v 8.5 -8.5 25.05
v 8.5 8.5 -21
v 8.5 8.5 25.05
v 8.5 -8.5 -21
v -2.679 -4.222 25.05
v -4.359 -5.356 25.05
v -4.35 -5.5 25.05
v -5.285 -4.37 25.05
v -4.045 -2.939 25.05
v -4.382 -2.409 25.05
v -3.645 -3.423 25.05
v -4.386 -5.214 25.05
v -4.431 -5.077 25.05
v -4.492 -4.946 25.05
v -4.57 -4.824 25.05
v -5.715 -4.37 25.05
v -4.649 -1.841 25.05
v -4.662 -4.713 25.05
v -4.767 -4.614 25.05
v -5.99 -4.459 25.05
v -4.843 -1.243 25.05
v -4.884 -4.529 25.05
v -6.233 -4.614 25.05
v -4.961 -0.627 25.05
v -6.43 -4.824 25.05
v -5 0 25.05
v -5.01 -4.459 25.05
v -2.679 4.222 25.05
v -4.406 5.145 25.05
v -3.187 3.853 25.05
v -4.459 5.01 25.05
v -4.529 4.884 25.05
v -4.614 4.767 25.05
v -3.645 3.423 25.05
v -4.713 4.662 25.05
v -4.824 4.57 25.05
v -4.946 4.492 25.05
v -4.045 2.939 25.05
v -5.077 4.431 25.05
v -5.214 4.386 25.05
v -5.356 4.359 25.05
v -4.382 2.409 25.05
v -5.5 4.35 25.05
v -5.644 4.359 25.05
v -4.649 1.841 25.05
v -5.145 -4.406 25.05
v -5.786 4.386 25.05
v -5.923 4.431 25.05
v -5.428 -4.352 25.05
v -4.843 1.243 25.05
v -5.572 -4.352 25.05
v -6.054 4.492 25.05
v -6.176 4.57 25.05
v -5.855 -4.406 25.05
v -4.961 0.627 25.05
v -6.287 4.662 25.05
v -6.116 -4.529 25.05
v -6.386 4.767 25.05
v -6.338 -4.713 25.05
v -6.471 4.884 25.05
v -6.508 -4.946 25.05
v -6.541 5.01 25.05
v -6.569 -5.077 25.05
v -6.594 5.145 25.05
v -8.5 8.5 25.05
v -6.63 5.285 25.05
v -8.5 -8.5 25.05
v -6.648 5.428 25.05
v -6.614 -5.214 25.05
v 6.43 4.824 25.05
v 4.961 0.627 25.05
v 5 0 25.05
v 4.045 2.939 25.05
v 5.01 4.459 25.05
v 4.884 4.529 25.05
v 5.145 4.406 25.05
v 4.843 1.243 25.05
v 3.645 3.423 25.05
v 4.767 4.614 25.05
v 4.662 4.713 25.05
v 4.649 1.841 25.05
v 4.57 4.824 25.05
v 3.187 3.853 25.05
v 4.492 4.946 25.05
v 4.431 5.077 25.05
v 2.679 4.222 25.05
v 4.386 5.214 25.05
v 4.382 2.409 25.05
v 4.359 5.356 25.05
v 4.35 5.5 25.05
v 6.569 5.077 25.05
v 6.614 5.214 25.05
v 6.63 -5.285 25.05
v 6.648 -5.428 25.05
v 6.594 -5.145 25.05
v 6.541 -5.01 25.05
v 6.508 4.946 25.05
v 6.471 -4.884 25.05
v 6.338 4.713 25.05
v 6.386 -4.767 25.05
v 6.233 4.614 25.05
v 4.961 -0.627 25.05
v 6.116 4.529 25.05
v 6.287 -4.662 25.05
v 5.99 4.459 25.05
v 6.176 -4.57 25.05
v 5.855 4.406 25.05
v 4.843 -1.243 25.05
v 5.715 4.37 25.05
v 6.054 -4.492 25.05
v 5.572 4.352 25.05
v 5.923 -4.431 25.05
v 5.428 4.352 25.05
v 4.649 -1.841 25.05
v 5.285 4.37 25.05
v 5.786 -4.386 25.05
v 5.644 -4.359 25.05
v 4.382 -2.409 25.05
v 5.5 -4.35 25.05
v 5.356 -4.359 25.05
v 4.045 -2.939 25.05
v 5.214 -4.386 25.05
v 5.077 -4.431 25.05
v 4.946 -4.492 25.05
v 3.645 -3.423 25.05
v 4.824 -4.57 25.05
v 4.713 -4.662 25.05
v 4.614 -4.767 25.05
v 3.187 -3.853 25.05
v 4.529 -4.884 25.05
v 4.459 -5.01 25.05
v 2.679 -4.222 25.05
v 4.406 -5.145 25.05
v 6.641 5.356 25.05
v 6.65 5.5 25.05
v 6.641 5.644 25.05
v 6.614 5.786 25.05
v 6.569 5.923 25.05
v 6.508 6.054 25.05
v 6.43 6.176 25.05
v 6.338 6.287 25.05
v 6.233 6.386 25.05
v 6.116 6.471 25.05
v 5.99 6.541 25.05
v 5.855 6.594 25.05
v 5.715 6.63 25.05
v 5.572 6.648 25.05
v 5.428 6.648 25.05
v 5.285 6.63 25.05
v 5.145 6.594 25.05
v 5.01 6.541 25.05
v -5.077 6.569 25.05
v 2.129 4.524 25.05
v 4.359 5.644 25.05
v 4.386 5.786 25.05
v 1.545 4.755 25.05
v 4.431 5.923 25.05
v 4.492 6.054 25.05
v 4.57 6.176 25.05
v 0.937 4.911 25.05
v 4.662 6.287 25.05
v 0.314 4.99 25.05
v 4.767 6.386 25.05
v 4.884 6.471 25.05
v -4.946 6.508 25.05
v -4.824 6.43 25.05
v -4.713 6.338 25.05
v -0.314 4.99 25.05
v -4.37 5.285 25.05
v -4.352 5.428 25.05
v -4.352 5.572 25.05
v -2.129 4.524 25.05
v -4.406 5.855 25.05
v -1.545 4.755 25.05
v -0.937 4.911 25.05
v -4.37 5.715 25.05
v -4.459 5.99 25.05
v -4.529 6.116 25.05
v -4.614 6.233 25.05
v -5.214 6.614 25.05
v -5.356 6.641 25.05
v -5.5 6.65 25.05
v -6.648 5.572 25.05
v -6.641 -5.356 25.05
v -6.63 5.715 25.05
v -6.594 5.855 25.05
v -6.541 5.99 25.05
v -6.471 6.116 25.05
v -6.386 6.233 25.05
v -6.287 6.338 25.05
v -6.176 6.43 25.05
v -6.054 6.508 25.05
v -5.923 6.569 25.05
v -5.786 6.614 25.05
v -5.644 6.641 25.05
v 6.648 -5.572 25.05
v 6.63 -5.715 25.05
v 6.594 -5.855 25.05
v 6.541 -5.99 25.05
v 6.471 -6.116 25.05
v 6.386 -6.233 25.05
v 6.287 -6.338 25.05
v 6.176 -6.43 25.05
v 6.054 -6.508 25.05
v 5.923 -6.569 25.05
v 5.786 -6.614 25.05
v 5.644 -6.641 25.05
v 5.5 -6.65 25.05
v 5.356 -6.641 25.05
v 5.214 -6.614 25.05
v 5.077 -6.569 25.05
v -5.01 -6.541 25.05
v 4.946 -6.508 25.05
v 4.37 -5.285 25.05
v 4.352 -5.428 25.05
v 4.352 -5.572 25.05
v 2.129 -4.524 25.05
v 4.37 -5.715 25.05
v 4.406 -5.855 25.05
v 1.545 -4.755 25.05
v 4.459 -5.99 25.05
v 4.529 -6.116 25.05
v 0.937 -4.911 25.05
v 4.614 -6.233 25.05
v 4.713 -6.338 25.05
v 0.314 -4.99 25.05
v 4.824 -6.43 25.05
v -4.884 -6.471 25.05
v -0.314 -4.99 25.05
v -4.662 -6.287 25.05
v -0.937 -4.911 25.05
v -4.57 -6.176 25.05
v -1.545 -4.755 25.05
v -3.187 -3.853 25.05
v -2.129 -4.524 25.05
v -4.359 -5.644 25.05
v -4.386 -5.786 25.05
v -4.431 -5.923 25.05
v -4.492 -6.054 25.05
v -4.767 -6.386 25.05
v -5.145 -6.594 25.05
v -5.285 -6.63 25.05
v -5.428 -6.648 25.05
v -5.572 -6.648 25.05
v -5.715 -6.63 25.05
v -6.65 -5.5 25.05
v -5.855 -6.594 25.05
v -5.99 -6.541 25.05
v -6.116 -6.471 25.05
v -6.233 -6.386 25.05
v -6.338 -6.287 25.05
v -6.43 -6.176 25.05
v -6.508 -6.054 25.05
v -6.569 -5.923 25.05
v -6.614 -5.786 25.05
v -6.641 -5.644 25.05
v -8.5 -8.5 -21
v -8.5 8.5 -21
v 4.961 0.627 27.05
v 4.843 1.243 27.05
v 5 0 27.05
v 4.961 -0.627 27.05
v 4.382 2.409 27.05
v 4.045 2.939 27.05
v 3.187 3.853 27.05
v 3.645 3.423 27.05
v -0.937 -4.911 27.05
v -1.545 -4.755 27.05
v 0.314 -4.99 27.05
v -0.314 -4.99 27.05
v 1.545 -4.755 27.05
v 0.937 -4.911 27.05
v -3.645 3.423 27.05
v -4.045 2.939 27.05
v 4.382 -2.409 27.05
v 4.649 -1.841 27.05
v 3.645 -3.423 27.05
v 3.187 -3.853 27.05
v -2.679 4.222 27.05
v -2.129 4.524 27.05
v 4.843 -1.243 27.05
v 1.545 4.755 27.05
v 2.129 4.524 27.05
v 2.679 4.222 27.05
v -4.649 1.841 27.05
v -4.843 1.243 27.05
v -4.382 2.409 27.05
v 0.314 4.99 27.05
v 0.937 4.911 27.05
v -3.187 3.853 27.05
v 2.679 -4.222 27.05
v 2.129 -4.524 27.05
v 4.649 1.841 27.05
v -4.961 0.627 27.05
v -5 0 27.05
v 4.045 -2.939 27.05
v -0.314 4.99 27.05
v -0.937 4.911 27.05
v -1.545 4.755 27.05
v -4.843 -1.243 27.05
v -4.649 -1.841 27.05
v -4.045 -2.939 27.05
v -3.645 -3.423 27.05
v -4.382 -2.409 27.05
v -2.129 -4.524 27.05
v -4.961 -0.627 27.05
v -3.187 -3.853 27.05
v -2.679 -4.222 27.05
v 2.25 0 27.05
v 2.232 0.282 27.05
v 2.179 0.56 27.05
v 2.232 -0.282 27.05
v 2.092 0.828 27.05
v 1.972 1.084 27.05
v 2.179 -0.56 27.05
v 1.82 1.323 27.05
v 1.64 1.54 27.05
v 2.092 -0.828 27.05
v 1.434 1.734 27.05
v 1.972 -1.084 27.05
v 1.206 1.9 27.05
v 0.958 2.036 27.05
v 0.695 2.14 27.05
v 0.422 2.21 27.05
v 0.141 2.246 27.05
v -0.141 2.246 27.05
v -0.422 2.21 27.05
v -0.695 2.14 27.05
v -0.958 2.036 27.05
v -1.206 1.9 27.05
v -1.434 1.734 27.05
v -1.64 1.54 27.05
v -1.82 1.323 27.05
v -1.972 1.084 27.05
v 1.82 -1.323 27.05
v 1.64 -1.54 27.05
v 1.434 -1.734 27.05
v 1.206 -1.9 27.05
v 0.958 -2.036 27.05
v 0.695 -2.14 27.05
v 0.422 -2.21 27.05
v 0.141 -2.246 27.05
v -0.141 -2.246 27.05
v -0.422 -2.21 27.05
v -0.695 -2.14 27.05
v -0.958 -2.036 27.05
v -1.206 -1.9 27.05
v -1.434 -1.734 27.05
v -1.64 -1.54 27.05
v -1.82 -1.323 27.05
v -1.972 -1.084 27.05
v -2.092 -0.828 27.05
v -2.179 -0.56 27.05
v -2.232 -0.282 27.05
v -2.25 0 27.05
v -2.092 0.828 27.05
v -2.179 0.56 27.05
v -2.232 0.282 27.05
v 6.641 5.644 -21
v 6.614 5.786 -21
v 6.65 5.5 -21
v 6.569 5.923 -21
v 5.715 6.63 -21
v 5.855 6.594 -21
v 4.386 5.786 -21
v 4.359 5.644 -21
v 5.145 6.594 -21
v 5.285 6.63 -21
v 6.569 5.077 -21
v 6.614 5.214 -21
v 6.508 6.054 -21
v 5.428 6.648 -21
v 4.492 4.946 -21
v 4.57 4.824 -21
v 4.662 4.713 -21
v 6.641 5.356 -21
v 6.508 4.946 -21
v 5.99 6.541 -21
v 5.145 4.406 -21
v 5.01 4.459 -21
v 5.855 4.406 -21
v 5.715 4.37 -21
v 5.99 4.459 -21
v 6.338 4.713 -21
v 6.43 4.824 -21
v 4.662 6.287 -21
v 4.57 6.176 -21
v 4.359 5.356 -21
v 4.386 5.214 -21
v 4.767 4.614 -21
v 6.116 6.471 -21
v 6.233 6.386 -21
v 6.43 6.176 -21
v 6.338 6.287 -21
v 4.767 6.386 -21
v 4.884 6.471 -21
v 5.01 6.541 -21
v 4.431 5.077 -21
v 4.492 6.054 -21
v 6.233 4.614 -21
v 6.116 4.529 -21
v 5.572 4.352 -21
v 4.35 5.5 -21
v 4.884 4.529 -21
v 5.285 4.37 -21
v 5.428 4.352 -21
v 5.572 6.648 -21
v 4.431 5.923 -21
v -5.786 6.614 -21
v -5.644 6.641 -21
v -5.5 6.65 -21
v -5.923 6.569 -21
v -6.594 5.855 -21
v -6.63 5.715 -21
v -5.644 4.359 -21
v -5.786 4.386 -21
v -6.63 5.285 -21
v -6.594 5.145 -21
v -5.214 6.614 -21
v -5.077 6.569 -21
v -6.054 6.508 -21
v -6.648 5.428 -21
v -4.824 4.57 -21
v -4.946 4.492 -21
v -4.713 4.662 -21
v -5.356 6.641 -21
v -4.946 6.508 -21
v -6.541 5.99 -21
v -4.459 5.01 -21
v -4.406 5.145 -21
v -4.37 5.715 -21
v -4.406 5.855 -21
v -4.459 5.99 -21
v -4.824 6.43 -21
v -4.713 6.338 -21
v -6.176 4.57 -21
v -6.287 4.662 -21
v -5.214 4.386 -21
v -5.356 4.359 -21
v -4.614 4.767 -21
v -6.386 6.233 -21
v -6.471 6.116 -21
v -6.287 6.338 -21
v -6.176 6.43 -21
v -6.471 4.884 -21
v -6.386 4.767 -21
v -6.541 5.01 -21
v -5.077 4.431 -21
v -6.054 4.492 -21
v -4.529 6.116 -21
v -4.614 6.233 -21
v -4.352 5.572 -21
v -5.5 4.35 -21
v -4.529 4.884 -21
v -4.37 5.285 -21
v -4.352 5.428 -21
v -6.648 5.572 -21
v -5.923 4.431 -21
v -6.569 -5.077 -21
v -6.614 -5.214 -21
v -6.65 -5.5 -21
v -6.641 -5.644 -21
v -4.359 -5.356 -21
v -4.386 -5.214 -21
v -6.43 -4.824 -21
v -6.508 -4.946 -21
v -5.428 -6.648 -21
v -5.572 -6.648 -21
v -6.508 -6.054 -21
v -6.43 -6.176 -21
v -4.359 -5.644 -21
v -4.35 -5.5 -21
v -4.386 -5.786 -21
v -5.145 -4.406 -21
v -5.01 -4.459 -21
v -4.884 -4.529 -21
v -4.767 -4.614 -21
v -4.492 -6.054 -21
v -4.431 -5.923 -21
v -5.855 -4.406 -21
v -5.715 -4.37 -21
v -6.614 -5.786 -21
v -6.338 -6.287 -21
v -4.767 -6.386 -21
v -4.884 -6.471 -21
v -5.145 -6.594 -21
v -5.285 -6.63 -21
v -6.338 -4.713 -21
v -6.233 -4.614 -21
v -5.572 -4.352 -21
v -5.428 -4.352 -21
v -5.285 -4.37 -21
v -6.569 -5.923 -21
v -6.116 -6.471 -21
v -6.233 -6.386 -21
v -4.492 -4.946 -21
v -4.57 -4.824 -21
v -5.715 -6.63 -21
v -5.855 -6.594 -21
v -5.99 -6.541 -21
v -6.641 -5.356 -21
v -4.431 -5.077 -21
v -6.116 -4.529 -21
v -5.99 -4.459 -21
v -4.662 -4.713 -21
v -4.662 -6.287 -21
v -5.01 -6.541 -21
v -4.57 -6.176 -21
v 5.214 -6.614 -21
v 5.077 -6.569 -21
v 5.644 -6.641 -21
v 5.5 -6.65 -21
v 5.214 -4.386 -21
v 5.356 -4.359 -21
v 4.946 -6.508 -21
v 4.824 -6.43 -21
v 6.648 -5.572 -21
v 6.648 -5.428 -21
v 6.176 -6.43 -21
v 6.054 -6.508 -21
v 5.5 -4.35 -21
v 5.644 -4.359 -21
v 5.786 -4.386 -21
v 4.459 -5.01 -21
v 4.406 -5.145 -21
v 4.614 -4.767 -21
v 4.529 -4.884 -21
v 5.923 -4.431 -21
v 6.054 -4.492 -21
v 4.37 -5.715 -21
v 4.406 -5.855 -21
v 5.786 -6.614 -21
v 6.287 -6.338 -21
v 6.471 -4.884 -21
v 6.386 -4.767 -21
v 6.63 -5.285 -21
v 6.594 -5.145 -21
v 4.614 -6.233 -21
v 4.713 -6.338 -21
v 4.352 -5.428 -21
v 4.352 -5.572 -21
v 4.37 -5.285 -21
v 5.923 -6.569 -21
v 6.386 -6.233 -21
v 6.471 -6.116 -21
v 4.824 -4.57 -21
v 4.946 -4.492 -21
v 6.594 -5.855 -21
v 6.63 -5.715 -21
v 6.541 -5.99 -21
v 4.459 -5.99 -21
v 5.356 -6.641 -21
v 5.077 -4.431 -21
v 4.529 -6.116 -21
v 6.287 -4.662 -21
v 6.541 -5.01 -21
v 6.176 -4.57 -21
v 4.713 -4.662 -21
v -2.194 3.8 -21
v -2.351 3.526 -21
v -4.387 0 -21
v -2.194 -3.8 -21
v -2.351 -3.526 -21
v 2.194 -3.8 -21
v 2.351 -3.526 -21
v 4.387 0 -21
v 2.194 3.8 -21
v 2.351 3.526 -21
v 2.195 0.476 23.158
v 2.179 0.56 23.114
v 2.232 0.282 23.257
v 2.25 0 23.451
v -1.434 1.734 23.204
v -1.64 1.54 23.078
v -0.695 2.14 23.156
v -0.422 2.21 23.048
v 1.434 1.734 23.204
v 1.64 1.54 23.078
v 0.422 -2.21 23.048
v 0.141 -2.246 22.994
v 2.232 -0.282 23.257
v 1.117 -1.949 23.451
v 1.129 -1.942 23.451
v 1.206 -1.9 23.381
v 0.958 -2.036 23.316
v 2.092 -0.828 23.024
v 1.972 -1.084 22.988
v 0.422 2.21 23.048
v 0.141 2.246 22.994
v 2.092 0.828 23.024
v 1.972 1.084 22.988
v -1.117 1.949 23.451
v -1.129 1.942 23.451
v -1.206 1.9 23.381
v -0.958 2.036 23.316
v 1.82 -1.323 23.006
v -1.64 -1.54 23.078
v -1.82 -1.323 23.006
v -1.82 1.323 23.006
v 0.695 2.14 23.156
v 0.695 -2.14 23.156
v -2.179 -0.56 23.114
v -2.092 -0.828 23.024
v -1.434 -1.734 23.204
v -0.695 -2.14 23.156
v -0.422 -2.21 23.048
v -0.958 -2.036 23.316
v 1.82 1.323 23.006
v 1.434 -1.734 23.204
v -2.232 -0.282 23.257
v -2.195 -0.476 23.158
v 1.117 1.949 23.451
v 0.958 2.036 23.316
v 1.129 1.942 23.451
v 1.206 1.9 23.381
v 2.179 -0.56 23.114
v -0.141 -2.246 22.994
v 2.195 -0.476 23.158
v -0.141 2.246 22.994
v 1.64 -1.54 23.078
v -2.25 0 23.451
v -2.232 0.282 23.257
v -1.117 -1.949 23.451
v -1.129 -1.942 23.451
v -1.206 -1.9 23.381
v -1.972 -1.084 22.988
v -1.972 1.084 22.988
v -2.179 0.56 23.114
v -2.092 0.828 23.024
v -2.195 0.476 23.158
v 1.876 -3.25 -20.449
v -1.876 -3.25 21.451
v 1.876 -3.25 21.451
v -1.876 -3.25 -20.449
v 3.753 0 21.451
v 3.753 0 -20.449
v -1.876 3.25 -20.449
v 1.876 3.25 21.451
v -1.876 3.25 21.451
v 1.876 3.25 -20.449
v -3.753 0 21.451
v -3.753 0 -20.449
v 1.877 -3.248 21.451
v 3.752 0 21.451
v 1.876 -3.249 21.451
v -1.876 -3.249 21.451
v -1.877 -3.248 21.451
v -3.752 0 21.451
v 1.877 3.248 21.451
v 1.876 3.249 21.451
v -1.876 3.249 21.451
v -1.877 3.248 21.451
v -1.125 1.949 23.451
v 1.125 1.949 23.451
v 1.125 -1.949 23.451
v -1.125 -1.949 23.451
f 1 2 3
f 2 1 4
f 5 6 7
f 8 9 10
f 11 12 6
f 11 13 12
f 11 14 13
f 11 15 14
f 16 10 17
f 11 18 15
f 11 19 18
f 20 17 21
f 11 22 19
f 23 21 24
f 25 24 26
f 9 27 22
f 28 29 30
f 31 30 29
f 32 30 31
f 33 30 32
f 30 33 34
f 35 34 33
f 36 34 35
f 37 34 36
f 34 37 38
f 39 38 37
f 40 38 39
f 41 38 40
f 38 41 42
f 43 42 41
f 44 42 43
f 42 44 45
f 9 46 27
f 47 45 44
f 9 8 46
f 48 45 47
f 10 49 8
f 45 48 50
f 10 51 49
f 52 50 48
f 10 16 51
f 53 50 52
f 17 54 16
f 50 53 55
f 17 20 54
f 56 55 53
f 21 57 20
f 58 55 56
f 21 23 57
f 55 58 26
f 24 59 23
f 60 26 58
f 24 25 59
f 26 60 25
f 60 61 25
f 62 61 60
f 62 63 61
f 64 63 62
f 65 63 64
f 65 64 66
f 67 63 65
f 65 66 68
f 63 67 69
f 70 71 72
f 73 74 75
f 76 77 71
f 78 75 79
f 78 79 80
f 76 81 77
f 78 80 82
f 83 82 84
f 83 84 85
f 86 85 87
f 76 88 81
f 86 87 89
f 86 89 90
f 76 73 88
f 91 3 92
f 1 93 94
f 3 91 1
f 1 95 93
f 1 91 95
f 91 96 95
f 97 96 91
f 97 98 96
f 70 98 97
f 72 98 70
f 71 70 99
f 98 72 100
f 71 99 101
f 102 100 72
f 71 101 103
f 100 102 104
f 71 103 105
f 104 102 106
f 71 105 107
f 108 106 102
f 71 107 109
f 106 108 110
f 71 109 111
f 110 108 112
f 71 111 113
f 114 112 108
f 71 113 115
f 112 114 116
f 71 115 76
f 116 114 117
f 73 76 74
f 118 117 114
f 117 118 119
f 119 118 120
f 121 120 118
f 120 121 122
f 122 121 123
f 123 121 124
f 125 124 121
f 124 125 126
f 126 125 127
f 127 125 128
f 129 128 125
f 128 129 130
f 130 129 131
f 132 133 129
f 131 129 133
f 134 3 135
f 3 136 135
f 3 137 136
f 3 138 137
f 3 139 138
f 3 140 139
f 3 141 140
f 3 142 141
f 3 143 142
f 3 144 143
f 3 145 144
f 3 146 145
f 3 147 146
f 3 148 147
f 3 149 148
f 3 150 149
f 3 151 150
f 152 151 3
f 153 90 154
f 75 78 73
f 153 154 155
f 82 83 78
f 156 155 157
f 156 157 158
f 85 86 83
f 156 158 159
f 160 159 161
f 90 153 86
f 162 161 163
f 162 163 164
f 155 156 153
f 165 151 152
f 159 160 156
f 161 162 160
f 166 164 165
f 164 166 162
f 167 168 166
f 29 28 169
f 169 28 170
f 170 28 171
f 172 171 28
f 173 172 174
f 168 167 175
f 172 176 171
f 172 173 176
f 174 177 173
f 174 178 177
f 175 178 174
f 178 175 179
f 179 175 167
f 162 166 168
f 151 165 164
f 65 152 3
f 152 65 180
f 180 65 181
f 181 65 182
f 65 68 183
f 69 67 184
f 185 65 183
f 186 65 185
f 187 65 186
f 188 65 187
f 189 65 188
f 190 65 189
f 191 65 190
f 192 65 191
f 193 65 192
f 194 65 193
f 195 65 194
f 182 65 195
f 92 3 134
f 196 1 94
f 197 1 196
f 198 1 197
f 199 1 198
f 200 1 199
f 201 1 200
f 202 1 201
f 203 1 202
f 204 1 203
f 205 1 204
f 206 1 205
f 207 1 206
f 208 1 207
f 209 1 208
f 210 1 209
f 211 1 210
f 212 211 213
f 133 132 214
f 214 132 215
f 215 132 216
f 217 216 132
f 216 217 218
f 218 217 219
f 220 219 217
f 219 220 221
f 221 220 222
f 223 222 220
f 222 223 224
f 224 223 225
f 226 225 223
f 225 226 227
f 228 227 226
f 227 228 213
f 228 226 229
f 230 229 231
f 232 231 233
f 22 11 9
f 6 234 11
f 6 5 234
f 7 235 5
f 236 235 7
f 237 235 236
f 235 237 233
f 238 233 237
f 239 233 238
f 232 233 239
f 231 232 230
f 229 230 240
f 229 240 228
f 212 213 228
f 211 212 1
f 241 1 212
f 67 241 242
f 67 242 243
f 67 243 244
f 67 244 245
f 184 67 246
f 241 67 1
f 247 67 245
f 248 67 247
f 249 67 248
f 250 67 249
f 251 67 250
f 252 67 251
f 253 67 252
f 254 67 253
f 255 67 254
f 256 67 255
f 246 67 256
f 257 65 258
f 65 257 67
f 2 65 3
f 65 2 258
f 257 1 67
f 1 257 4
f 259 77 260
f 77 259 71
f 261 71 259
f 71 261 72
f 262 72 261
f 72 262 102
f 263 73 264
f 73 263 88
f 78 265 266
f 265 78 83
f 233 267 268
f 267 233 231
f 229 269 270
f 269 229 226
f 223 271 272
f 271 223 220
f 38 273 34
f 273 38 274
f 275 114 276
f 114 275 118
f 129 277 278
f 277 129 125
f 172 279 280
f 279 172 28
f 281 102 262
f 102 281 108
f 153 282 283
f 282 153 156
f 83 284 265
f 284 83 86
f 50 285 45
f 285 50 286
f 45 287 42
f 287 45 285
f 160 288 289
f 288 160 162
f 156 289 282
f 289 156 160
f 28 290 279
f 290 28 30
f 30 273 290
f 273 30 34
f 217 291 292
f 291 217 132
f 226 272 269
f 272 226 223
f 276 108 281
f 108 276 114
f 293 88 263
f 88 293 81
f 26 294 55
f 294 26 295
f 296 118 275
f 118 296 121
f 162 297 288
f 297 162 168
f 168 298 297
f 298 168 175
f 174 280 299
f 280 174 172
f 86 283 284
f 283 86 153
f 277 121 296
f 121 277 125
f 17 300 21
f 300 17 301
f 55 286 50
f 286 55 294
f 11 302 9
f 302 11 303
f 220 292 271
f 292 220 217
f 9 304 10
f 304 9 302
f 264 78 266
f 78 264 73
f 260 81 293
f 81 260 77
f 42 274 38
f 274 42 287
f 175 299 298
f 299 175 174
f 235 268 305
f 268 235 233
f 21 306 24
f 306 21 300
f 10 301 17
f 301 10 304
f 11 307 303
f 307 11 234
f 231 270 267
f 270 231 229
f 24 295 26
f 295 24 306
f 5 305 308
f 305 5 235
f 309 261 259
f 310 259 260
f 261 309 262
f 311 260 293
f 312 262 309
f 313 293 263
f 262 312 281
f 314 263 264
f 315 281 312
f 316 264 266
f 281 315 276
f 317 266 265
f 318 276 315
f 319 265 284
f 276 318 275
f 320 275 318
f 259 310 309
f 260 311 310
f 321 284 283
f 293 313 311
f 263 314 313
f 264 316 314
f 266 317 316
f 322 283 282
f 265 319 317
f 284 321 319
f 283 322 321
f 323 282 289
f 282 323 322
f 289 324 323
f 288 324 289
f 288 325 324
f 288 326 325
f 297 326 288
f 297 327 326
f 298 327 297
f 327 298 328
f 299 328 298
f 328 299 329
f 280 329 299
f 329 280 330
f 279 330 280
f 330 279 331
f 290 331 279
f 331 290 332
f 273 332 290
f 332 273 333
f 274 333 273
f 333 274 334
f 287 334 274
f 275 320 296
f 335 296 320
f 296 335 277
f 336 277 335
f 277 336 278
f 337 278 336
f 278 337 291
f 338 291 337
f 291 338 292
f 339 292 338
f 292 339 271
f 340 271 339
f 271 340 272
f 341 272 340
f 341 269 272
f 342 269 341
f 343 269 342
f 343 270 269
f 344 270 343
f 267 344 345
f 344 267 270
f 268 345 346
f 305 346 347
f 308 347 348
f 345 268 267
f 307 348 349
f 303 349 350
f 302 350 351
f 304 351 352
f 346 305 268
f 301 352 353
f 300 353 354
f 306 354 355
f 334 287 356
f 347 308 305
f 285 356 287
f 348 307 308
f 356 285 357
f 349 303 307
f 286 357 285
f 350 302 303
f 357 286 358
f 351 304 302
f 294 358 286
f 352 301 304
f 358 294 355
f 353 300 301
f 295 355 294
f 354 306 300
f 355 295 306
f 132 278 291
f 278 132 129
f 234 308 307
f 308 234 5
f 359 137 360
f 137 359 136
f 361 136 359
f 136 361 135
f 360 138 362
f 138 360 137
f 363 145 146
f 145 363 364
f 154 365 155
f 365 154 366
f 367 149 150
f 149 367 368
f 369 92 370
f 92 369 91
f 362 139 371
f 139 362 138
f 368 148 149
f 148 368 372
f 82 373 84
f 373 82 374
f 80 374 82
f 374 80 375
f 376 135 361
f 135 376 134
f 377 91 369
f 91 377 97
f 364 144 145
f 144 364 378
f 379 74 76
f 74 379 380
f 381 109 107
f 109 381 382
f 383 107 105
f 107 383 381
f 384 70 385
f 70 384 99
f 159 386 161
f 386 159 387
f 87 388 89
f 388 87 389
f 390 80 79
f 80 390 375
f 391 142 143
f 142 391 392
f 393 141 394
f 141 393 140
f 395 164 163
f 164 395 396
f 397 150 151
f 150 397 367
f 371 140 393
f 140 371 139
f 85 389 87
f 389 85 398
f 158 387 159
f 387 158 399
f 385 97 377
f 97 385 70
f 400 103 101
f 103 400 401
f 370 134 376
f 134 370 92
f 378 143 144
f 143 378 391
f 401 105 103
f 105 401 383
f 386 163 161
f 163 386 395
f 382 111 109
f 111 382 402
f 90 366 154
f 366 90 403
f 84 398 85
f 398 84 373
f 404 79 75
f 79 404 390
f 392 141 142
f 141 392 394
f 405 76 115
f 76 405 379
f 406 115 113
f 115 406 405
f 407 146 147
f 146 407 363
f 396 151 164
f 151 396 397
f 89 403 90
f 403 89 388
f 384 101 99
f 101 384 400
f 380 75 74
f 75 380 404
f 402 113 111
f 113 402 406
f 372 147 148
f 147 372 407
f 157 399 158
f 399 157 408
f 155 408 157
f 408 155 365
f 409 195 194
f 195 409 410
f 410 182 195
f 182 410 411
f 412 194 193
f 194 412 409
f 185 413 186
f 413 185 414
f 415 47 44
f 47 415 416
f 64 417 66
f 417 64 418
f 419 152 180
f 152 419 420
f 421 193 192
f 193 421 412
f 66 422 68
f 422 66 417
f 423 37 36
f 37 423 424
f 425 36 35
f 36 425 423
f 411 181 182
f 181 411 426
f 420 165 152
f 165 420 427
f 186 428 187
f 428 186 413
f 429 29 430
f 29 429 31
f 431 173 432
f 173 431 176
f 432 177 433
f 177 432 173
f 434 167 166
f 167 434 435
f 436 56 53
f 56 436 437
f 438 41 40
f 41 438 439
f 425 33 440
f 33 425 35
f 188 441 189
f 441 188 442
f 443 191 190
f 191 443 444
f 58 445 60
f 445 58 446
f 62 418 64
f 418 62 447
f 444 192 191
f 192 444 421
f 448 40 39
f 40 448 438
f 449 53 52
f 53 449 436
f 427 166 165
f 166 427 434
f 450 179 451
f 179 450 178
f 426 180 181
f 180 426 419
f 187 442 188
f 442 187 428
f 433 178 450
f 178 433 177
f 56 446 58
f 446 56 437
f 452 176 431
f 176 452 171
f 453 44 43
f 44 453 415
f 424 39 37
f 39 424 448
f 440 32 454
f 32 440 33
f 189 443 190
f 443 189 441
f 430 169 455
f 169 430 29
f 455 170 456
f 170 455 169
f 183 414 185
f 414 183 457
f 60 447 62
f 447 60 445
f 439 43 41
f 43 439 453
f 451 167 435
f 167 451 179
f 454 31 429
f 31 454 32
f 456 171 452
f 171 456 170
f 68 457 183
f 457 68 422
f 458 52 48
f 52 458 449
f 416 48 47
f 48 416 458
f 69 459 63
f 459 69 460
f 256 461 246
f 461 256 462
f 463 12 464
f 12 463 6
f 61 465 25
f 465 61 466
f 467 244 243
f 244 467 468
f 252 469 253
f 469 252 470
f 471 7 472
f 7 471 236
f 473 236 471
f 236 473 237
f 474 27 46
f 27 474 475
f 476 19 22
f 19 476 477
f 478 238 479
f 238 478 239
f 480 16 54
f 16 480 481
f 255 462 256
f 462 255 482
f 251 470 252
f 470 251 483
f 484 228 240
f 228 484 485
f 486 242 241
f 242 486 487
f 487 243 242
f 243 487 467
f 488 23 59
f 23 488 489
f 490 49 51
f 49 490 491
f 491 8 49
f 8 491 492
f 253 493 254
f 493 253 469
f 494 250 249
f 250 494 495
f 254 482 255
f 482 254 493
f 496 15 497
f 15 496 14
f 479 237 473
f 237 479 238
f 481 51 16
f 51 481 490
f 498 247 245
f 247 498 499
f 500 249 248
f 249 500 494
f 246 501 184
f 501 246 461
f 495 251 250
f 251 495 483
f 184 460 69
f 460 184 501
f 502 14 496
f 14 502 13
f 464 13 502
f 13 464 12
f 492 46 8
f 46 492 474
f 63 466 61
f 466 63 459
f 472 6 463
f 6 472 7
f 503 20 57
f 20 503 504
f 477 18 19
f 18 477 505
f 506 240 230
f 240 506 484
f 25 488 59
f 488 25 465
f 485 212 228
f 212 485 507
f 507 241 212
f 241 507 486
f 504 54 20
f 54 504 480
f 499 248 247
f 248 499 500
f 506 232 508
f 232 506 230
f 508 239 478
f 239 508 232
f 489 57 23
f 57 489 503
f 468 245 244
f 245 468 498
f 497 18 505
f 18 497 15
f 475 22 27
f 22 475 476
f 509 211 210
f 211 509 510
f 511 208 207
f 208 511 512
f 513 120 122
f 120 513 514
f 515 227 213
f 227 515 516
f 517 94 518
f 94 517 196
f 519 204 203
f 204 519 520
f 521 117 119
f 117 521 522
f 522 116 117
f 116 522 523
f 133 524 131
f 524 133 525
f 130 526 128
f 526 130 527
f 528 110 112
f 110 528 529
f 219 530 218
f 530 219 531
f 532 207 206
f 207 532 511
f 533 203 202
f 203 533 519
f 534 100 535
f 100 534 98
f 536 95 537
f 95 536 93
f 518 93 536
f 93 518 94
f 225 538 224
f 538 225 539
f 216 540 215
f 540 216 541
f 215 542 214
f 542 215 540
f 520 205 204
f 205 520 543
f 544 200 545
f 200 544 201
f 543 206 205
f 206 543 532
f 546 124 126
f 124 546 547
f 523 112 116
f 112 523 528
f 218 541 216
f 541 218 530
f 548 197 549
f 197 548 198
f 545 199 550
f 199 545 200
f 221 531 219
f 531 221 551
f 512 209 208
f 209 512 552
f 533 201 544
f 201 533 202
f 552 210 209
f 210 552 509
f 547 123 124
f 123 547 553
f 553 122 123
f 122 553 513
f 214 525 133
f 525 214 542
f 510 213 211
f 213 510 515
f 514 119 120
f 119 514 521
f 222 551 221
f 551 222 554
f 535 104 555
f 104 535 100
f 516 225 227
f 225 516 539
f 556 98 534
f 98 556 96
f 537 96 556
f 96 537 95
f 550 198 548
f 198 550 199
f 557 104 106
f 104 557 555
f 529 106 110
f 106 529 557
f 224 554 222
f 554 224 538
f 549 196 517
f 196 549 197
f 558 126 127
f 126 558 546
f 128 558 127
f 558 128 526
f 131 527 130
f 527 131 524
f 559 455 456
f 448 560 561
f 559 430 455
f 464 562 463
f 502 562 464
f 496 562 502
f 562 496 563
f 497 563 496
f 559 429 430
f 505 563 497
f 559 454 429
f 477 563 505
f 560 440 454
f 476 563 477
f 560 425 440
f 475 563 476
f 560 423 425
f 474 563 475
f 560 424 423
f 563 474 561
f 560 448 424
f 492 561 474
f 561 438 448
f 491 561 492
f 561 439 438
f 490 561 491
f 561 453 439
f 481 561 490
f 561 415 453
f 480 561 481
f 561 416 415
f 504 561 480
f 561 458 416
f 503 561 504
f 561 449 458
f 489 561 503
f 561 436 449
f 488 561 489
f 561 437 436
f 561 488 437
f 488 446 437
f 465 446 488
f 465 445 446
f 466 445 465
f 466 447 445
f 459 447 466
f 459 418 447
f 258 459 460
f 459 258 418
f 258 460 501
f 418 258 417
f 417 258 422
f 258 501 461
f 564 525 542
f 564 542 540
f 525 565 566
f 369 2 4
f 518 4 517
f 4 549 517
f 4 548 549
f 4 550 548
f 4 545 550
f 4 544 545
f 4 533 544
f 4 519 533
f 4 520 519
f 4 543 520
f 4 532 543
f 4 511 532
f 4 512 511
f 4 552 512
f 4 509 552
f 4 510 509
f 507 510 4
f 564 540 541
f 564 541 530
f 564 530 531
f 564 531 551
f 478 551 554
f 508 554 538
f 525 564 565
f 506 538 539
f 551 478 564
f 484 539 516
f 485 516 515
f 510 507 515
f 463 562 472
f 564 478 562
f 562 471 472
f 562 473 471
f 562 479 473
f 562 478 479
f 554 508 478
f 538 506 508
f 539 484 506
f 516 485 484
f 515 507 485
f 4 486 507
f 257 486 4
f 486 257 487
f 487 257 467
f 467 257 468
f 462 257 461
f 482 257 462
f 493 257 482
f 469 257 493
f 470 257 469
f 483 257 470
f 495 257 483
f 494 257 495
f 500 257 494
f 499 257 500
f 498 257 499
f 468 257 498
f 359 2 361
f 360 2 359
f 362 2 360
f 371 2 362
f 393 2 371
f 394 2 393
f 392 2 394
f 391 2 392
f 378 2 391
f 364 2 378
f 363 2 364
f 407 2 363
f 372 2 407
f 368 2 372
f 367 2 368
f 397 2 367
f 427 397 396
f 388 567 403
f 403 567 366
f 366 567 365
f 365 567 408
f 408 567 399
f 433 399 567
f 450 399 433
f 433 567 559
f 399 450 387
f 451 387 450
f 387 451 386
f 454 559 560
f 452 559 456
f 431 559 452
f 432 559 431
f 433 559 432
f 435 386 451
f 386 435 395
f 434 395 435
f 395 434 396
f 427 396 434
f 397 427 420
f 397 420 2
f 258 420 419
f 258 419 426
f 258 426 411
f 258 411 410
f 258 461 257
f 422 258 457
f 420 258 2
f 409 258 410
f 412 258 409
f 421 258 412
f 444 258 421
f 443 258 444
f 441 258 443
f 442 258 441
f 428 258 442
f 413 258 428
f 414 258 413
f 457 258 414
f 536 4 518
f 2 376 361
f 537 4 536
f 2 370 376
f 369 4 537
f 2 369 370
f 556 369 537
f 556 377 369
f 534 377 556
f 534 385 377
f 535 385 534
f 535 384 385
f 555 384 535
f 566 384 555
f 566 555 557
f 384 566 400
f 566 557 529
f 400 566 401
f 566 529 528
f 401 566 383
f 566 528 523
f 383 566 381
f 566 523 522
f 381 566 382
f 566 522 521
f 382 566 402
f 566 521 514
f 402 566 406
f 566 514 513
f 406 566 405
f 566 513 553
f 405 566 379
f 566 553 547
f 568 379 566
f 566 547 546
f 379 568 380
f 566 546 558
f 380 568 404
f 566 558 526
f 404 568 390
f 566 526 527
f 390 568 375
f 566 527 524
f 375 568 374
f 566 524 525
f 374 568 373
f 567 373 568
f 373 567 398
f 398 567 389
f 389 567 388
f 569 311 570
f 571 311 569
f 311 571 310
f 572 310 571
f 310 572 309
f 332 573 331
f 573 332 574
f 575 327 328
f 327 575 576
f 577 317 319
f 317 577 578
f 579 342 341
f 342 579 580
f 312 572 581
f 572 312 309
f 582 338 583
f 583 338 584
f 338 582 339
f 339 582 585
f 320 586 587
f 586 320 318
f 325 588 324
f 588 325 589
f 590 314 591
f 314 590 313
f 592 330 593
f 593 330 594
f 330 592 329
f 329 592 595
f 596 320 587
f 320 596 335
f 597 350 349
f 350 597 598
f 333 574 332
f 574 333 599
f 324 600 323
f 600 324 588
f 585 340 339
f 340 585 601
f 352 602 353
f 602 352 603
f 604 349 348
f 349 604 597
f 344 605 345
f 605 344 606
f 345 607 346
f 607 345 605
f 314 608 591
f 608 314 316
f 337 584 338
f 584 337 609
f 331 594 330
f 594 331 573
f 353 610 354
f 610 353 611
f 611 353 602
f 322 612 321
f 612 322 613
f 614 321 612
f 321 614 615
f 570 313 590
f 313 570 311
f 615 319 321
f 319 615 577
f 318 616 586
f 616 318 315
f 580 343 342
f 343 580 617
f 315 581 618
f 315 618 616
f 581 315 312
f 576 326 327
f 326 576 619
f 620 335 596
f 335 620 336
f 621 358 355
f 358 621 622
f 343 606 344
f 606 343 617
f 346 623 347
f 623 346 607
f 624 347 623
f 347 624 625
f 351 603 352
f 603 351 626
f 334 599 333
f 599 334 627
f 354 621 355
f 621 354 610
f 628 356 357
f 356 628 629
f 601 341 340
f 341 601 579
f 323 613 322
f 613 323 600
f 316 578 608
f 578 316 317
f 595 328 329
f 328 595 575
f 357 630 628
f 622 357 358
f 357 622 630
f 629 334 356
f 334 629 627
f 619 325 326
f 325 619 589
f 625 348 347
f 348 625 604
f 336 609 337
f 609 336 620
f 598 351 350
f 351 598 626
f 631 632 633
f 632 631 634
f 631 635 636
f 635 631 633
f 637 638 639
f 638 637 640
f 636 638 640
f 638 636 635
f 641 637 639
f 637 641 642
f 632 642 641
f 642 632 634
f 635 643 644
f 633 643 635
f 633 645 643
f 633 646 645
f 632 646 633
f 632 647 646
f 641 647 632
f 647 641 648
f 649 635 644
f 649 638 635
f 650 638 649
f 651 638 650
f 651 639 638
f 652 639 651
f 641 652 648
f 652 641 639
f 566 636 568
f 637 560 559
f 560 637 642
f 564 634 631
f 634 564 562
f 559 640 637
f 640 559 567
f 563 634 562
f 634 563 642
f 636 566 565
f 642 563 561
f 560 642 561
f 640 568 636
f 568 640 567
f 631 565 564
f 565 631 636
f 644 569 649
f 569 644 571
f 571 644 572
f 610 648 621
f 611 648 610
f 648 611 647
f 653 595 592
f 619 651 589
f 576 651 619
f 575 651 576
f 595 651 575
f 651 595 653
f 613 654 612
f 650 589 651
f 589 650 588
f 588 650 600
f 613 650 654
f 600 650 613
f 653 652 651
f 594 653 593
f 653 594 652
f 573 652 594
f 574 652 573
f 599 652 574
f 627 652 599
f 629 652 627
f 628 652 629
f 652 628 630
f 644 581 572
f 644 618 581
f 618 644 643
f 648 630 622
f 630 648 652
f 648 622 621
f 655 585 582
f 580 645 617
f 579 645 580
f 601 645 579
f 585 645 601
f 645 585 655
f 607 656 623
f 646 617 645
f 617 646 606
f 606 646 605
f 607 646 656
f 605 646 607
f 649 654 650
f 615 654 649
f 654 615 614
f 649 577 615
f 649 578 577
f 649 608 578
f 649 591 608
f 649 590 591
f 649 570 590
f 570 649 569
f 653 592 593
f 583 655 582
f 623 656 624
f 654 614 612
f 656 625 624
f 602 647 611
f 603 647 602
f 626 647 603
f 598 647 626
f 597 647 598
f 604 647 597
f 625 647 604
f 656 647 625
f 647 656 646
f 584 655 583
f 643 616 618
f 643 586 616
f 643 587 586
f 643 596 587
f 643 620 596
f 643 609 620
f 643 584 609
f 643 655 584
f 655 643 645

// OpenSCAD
gore=1; // napravi gornji dio
dolje=0; // napravi donji dio
presjek=0; // vizualiziraj unutrasnjost

podizac_xy=17;

sarafi_xy=11;
sarafi_navoj_d=2.3; // rupa za navoj sarafa
sarafi_prolaz_d=3.5;
// sarafi_h=10; // dubina rupe za saraf

krug_d=10;
krug_h=2;

rez_h=4; // dužina odrezanog dijela
rez_d=0.1; // veličina samog reza

matica_d=6.5;  // šitina 6-kutne rupe da matica lagano prođe. Matica je široka 6.0 mm
ulaz_matica_h=0.6; // dubina proširenog ulaza za maticu
ulaz_matica_d=matica_d+2*ulaz_matica_h; // veličina proširenog ulaza
//matica_h=22.4; // dubina rupe za 2 matice i feder (1 matica je dugačka 8.1 mm, neopterećen feder je 8 mm)
matica_h=2*8+28-1.5; // feder 28 mm
podizac_h=matica_h+7.6;
sipka_d=4.5; // rupa za navojnu šipku, dosta lufta
prijelaz_h=matica_d-sipka_d; // visina konusnog 6-kutnog prijelaza od matice prema rupi za šipku da ne padnu slojevi

union()
{
  difference()
  {
    union()
    {
      cube([podizac_xy, podizac_xy,podizac_h],center=true);
      translate([0,0,podizac_h/2+krug_h/2])
        cylinder(d=krug_d,h=krug_h,$fn=50,center=true);
    }  
    union()
    {
      // sarafi kroz sve
      for(i=[0:3])
        rotate([0,0,90*i])
        {
          // navoj sarafa
          translate([sarafi_xy/2,sarafi_xy/2,0])
            cylinder(d=sarafi_navoj_d,h=podizac_h+0.001,$fn=50,center=true);
          // rupa kroz donji odrezani dio
          translate([sarafi_xy/2,sarafi_xy/2,-podizac_h/2+rez_h/2])
            cylinder(d=sarafi_prolaz_d,h=rez_h+0.001,$fn=50,center=true);
  
        }
      // rez koji odvaja 2 dijela polovice
      translate([0,0,-podizac_h/2+rez_h])
        cube([podizac_xy,podizac_xy,rez_d],center=true);

      // skorz uklonit donji dio
      if( dolje == 0 )
      {
        translate([0,0,-podizac_h/2+rez_h/2])
          cube([podizac_xy+0.001,podizac_xy+0.001,rez_h+0.001],center=true);
      }

      // skorz uklonit gornji dio
      if( gore == 0 )
      {
        translate([0,0,-podizac_h/2+rez_h+(podizac_h+krug_h-rez_h)/2])
          cube([podizac_xy+0.001,podizac_xy+0.001,(podizac_h+krug_h-rez_h)+0.001],center=true);
      }

      // rupa za navojnu šipku
      cylinder(d=sipka_d,h=2*podizac_h,$fn=50,center=true);

      // 6-kutna rupa za matice
      translate([0,0,(-podizac_h/2+rez_h)+matica_h/2])
        cylinder(d=matica_d*2/sqrt(3),h=matica_h+0.001,$fn=6,center=true);

      // konusni 6-kutni prošireni ulaz za matice
      translate([0,0,(-podizac_h/2+rez_h)+ulaz_matica_h/2])
        cylinder(d1=ulaz_matica_d*2/sqrt(3),d2=matica_d*2/sqrt(3),h=ulaz_matica_h+0.001,$fn=6,center=true);

      // konusni 6-kutni prijelaz od matice prema rupi,
      // da ne padnu isprintani slojevi
      translate([0,0,(-podizac_h/2+rez_h)+matica_h+prijelaz_h/2])
        cylinder(d1=matica_d*2/sqrt(3),d2=sipka_d,h=prijelaz_h+0.001,$fn=6,center=true);
      
      // kocka za presjek radi vizualizacije unutrasnjosti
      if(presjek)
      translate([podizac_xy/2,0,0])
      cube([podizac_xy,podizac_xy+0.01,podizac_h*2],center=true);
    }
  }
}
